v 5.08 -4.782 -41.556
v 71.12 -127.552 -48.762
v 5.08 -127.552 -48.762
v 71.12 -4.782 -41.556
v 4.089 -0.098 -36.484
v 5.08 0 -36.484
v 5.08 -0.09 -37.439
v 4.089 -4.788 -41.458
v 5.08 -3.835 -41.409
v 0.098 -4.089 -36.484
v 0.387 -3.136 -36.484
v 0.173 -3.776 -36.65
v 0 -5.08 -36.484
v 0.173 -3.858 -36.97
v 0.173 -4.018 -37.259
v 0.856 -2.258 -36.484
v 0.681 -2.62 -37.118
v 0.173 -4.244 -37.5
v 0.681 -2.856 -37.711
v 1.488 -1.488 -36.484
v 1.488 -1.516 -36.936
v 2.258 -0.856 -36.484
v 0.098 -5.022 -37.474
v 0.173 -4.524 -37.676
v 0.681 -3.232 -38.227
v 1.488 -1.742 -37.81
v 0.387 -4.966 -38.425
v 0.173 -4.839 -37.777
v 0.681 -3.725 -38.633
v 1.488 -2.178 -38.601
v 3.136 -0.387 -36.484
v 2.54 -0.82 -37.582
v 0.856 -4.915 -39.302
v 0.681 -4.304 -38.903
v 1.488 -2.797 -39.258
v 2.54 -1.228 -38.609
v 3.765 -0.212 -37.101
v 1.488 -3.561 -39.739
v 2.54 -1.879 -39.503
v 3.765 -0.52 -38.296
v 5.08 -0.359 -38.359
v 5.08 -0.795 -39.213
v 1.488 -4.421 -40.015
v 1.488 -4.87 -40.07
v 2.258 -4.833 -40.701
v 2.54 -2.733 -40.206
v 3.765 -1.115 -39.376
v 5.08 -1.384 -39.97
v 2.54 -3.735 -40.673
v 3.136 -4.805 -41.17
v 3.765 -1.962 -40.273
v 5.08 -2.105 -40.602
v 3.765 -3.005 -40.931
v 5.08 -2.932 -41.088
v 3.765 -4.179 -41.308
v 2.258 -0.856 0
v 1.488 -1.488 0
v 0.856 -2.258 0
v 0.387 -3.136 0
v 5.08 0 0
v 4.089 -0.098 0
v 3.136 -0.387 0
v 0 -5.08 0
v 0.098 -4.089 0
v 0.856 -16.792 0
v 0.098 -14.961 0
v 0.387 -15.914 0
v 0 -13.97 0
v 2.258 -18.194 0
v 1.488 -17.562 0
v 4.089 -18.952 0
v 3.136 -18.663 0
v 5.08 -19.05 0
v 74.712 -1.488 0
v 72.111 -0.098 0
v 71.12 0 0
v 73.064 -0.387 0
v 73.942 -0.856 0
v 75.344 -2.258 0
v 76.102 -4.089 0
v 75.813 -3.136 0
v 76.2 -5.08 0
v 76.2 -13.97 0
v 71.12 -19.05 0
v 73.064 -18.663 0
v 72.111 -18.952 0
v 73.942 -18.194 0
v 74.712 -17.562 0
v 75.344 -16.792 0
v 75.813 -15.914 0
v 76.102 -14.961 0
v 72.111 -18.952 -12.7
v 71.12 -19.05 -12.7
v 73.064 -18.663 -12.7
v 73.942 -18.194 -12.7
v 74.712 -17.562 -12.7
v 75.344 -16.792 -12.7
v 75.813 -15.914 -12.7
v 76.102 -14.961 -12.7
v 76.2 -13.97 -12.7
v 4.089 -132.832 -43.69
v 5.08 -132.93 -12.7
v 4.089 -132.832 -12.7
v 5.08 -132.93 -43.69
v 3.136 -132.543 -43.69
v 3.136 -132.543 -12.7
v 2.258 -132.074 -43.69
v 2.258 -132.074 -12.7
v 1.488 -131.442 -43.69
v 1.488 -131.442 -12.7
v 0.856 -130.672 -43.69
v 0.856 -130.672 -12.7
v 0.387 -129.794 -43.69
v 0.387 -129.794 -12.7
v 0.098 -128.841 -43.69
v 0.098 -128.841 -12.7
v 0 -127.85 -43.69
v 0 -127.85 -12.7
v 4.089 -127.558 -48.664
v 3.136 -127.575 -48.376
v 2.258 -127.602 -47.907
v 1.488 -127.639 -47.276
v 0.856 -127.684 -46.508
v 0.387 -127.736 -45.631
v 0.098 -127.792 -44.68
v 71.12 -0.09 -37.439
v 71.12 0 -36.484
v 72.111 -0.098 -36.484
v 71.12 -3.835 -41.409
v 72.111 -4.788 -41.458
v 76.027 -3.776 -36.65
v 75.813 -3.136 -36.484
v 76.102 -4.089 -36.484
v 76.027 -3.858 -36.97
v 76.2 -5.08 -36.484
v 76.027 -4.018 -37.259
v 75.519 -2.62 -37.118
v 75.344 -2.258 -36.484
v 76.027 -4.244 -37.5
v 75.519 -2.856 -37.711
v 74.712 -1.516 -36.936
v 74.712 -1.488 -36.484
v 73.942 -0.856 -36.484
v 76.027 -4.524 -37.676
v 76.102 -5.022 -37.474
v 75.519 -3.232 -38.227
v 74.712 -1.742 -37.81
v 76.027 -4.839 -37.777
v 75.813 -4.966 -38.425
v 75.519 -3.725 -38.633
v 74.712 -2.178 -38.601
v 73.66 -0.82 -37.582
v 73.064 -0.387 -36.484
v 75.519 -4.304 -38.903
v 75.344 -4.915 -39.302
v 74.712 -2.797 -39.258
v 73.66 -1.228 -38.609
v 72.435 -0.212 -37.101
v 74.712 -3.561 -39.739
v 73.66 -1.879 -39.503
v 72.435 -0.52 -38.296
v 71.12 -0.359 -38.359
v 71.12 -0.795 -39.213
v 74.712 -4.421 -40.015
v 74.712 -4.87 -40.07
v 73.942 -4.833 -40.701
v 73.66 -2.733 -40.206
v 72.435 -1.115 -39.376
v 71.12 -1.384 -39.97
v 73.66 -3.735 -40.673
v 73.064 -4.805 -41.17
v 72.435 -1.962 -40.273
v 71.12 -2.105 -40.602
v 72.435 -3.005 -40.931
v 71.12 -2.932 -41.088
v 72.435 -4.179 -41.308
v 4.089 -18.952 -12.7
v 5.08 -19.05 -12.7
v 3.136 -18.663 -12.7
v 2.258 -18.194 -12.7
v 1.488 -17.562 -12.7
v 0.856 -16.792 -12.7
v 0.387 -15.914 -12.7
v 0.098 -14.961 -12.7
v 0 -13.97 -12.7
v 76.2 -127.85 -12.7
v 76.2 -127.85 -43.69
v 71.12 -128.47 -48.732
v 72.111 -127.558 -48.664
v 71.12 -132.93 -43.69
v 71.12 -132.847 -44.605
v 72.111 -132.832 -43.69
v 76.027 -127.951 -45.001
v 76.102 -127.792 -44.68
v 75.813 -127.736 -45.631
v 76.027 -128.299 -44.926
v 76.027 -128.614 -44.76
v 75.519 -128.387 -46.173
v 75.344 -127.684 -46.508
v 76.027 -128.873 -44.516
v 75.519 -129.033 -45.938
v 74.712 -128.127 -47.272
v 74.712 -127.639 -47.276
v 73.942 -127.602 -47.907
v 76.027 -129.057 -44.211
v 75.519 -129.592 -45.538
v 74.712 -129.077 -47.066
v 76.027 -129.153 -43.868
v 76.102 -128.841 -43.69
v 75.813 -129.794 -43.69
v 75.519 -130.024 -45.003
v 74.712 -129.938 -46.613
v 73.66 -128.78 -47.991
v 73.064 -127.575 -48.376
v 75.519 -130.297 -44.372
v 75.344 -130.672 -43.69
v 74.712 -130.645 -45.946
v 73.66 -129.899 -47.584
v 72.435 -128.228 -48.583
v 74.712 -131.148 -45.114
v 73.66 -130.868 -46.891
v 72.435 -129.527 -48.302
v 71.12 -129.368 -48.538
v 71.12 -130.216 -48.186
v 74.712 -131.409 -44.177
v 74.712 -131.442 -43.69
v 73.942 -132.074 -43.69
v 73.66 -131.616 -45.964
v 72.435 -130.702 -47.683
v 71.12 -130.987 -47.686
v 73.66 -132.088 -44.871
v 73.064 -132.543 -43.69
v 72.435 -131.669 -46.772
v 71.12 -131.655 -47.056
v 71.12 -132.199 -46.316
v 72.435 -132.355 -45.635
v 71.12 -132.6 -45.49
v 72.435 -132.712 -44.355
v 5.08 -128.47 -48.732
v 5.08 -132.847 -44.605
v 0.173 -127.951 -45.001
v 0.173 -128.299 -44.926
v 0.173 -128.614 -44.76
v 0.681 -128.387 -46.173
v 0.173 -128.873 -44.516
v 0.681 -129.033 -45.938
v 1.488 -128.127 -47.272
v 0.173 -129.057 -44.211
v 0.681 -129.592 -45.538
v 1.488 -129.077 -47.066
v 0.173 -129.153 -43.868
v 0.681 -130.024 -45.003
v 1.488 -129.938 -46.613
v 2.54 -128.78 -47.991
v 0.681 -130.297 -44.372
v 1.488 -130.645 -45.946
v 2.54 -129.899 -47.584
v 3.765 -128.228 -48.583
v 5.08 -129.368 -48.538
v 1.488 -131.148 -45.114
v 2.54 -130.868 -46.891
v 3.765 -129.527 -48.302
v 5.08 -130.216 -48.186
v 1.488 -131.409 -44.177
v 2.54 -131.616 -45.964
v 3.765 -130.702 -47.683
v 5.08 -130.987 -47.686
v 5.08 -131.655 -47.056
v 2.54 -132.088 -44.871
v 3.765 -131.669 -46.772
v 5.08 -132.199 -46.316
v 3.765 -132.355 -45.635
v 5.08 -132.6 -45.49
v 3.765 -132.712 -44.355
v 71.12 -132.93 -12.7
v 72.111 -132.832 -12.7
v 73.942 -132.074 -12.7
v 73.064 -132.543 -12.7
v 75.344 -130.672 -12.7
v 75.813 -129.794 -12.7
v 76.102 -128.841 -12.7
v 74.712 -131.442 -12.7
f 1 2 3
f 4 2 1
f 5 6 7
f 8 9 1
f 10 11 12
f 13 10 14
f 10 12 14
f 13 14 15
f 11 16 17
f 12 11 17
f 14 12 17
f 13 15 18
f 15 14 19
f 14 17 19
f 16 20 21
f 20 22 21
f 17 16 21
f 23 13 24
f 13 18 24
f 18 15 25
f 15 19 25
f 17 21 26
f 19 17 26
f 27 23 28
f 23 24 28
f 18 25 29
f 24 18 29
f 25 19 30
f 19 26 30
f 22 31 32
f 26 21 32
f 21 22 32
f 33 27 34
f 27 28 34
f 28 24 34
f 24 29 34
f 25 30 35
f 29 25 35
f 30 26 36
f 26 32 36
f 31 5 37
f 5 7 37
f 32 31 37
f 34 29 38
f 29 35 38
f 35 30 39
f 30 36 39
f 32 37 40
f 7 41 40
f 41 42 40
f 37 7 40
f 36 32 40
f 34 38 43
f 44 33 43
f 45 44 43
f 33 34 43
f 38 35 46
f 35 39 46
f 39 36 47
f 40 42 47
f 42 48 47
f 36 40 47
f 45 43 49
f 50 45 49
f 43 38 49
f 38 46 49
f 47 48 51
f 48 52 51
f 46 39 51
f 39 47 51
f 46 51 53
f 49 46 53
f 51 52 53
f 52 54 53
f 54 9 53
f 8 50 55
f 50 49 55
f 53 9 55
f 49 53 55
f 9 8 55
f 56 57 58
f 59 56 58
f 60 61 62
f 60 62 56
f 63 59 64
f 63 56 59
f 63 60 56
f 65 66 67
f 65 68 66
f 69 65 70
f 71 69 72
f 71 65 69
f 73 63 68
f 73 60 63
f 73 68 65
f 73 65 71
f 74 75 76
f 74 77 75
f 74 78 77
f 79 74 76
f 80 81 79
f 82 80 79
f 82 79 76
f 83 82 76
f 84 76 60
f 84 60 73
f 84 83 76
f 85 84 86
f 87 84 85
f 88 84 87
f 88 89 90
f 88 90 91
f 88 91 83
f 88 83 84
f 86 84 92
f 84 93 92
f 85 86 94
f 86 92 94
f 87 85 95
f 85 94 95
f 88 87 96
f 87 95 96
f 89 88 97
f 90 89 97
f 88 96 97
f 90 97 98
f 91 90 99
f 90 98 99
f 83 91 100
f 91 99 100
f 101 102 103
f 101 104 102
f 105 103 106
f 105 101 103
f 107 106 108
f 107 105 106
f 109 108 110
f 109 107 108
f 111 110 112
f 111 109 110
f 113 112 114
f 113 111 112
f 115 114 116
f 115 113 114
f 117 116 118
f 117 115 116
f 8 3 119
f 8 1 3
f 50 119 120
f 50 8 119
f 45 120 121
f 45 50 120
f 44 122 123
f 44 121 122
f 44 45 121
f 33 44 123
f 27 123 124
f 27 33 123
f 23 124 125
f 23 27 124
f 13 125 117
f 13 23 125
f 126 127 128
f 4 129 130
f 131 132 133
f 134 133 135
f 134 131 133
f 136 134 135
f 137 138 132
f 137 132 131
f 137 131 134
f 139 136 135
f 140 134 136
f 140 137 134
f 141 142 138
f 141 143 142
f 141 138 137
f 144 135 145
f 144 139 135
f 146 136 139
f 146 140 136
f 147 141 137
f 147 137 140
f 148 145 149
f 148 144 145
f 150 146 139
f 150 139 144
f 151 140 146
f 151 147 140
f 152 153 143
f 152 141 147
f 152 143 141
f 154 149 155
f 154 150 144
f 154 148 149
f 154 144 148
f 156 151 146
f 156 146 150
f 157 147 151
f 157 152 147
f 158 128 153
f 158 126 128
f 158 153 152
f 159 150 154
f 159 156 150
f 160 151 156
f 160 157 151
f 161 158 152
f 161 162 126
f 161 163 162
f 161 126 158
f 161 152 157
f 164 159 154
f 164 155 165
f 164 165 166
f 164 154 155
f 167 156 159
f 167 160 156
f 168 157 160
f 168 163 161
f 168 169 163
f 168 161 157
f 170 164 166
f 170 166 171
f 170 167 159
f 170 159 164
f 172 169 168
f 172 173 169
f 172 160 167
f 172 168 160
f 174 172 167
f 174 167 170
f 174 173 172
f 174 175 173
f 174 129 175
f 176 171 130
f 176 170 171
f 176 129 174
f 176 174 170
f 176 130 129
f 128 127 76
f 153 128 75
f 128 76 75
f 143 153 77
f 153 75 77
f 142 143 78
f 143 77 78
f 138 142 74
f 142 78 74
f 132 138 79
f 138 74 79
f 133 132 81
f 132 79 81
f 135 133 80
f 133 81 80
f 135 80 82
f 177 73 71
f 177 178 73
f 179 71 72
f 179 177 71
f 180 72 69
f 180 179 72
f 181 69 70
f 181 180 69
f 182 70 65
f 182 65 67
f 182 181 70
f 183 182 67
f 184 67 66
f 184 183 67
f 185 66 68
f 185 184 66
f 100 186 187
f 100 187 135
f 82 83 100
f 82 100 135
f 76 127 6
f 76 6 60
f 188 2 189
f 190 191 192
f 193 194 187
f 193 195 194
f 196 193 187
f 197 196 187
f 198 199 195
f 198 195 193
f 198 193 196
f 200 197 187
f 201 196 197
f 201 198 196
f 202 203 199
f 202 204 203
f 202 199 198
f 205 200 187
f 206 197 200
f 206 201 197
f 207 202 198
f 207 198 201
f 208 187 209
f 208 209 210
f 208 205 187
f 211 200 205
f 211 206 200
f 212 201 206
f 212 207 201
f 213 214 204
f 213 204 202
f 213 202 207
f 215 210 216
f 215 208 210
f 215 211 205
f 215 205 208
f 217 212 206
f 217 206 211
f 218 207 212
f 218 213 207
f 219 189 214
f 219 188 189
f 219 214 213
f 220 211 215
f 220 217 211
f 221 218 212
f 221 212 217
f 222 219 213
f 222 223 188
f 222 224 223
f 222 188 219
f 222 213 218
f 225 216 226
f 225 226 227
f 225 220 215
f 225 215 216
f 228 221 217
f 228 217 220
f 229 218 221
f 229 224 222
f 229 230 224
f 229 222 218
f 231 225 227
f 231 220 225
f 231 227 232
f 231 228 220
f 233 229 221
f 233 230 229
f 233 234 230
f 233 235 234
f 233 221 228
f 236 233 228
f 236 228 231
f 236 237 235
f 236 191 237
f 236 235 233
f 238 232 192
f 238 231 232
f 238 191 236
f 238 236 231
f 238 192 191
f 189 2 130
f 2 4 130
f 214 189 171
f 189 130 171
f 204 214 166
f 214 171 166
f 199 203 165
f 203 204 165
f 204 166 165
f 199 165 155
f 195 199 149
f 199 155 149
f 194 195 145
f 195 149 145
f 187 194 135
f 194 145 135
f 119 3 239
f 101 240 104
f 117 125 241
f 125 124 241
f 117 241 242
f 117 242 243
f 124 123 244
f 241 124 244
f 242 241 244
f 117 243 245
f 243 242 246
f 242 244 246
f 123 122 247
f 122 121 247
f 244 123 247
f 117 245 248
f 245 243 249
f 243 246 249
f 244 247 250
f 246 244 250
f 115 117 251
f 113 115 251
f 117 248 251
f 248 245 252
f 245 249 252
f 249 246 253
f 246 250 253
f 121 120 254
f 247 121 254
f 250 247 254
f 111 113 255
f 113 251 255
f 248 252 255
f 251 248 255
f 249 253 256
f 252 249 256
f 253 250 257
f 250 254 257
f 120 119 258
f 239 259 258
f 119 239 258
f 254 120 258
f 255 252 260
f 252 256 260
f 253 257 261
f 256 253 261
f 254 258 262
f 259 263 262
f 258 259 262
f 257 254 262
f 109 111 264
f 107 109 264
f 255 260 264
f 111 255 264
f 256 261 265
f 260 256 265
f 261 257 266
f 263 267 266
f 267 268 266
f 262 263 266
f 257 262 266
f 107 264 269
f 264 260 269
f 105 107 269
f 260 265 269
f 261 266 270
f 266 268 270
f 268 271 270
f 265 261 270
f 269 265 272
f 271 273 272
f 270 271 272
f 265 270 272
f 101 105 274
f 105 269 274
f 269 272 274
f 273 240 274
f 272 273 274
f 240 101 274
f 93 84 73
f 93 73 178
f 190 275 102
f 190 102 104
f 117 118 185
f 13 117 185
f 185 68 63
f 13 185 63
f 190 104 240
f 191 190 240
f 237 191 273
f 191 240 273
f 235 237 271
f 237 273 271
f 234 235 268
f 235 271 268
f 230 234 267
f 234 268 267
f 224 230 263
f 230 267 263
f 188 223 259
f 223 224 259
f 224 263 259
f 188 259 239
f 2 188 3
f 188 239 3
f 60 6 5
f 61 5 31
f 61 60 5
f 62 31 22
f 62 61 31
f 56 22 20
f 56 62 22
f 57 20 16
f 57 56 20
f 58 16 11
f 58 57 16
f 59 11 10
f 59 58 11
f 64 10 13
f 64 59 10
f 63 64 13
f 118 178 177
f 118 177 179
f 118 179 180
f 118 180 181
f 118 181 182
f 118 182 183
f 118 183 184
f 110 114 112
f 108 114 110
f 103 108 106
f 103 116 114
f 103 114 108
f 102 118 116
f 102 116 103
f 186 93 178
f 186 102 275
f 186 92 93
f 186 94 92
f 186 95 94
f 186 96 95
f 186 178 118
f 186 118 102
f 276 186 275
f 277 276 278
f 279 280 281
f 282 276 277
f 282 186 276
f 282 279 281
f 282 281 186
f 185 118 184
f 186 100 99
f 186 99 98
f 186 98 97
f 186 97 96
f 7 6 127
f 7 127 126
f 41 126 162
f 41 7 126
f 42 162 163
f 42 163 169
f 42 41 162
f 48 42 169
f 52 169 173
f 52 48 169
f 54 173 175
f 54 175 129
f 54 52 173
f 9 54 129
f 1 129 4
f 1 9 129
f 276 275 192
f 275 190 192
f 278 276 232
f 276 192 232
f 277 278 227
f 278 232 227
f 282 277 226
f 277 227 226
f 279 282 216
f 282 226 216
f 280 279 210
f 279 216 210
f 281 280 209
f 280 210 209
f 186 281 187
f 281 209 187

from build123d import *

# Parameters (mm, degrees)
F2_DEPTH = 76.2
F3_R     = 5.08


# Not quite as in the source:
# - a feature names something its author has since deleted; it is built from what else it names


with BuildPart() as f2:
    # F1 (on offset) → F2 (new body)
    with BuildSketch(Plane.YZ.offset(76.2)):
        Polygon((0, -41.275), (0, 0), (-19.05, 0), (-19.05, -12.7), (-132.9298521399, -12.7), (-132.9298521399, -49.0773997059), align=None)
    extrude(amount=-F2_DEPTH)

    # F3
    f3_edges = [f2.edges().sort_by_distance(p)[0] for p in [
        (38.1, 0, -41.275),
        (76.2, 0, -20.6375),
        (0, 0, -20.6375),
        (76.2, -66.464926, -45.1762),
        (0, -66.464926, -45.1762),
        (0, -19.05, -6.35),
        (76.2, -19.05, -6.35),
        (0, -132.929852, -30.8887),
        (76.2, -132.929852, -30.8887),
        (38.1, -132.929852, -49.0774),
    ]]
    fillet(f3_edges, radius=F3_R)


solid = f2.part
